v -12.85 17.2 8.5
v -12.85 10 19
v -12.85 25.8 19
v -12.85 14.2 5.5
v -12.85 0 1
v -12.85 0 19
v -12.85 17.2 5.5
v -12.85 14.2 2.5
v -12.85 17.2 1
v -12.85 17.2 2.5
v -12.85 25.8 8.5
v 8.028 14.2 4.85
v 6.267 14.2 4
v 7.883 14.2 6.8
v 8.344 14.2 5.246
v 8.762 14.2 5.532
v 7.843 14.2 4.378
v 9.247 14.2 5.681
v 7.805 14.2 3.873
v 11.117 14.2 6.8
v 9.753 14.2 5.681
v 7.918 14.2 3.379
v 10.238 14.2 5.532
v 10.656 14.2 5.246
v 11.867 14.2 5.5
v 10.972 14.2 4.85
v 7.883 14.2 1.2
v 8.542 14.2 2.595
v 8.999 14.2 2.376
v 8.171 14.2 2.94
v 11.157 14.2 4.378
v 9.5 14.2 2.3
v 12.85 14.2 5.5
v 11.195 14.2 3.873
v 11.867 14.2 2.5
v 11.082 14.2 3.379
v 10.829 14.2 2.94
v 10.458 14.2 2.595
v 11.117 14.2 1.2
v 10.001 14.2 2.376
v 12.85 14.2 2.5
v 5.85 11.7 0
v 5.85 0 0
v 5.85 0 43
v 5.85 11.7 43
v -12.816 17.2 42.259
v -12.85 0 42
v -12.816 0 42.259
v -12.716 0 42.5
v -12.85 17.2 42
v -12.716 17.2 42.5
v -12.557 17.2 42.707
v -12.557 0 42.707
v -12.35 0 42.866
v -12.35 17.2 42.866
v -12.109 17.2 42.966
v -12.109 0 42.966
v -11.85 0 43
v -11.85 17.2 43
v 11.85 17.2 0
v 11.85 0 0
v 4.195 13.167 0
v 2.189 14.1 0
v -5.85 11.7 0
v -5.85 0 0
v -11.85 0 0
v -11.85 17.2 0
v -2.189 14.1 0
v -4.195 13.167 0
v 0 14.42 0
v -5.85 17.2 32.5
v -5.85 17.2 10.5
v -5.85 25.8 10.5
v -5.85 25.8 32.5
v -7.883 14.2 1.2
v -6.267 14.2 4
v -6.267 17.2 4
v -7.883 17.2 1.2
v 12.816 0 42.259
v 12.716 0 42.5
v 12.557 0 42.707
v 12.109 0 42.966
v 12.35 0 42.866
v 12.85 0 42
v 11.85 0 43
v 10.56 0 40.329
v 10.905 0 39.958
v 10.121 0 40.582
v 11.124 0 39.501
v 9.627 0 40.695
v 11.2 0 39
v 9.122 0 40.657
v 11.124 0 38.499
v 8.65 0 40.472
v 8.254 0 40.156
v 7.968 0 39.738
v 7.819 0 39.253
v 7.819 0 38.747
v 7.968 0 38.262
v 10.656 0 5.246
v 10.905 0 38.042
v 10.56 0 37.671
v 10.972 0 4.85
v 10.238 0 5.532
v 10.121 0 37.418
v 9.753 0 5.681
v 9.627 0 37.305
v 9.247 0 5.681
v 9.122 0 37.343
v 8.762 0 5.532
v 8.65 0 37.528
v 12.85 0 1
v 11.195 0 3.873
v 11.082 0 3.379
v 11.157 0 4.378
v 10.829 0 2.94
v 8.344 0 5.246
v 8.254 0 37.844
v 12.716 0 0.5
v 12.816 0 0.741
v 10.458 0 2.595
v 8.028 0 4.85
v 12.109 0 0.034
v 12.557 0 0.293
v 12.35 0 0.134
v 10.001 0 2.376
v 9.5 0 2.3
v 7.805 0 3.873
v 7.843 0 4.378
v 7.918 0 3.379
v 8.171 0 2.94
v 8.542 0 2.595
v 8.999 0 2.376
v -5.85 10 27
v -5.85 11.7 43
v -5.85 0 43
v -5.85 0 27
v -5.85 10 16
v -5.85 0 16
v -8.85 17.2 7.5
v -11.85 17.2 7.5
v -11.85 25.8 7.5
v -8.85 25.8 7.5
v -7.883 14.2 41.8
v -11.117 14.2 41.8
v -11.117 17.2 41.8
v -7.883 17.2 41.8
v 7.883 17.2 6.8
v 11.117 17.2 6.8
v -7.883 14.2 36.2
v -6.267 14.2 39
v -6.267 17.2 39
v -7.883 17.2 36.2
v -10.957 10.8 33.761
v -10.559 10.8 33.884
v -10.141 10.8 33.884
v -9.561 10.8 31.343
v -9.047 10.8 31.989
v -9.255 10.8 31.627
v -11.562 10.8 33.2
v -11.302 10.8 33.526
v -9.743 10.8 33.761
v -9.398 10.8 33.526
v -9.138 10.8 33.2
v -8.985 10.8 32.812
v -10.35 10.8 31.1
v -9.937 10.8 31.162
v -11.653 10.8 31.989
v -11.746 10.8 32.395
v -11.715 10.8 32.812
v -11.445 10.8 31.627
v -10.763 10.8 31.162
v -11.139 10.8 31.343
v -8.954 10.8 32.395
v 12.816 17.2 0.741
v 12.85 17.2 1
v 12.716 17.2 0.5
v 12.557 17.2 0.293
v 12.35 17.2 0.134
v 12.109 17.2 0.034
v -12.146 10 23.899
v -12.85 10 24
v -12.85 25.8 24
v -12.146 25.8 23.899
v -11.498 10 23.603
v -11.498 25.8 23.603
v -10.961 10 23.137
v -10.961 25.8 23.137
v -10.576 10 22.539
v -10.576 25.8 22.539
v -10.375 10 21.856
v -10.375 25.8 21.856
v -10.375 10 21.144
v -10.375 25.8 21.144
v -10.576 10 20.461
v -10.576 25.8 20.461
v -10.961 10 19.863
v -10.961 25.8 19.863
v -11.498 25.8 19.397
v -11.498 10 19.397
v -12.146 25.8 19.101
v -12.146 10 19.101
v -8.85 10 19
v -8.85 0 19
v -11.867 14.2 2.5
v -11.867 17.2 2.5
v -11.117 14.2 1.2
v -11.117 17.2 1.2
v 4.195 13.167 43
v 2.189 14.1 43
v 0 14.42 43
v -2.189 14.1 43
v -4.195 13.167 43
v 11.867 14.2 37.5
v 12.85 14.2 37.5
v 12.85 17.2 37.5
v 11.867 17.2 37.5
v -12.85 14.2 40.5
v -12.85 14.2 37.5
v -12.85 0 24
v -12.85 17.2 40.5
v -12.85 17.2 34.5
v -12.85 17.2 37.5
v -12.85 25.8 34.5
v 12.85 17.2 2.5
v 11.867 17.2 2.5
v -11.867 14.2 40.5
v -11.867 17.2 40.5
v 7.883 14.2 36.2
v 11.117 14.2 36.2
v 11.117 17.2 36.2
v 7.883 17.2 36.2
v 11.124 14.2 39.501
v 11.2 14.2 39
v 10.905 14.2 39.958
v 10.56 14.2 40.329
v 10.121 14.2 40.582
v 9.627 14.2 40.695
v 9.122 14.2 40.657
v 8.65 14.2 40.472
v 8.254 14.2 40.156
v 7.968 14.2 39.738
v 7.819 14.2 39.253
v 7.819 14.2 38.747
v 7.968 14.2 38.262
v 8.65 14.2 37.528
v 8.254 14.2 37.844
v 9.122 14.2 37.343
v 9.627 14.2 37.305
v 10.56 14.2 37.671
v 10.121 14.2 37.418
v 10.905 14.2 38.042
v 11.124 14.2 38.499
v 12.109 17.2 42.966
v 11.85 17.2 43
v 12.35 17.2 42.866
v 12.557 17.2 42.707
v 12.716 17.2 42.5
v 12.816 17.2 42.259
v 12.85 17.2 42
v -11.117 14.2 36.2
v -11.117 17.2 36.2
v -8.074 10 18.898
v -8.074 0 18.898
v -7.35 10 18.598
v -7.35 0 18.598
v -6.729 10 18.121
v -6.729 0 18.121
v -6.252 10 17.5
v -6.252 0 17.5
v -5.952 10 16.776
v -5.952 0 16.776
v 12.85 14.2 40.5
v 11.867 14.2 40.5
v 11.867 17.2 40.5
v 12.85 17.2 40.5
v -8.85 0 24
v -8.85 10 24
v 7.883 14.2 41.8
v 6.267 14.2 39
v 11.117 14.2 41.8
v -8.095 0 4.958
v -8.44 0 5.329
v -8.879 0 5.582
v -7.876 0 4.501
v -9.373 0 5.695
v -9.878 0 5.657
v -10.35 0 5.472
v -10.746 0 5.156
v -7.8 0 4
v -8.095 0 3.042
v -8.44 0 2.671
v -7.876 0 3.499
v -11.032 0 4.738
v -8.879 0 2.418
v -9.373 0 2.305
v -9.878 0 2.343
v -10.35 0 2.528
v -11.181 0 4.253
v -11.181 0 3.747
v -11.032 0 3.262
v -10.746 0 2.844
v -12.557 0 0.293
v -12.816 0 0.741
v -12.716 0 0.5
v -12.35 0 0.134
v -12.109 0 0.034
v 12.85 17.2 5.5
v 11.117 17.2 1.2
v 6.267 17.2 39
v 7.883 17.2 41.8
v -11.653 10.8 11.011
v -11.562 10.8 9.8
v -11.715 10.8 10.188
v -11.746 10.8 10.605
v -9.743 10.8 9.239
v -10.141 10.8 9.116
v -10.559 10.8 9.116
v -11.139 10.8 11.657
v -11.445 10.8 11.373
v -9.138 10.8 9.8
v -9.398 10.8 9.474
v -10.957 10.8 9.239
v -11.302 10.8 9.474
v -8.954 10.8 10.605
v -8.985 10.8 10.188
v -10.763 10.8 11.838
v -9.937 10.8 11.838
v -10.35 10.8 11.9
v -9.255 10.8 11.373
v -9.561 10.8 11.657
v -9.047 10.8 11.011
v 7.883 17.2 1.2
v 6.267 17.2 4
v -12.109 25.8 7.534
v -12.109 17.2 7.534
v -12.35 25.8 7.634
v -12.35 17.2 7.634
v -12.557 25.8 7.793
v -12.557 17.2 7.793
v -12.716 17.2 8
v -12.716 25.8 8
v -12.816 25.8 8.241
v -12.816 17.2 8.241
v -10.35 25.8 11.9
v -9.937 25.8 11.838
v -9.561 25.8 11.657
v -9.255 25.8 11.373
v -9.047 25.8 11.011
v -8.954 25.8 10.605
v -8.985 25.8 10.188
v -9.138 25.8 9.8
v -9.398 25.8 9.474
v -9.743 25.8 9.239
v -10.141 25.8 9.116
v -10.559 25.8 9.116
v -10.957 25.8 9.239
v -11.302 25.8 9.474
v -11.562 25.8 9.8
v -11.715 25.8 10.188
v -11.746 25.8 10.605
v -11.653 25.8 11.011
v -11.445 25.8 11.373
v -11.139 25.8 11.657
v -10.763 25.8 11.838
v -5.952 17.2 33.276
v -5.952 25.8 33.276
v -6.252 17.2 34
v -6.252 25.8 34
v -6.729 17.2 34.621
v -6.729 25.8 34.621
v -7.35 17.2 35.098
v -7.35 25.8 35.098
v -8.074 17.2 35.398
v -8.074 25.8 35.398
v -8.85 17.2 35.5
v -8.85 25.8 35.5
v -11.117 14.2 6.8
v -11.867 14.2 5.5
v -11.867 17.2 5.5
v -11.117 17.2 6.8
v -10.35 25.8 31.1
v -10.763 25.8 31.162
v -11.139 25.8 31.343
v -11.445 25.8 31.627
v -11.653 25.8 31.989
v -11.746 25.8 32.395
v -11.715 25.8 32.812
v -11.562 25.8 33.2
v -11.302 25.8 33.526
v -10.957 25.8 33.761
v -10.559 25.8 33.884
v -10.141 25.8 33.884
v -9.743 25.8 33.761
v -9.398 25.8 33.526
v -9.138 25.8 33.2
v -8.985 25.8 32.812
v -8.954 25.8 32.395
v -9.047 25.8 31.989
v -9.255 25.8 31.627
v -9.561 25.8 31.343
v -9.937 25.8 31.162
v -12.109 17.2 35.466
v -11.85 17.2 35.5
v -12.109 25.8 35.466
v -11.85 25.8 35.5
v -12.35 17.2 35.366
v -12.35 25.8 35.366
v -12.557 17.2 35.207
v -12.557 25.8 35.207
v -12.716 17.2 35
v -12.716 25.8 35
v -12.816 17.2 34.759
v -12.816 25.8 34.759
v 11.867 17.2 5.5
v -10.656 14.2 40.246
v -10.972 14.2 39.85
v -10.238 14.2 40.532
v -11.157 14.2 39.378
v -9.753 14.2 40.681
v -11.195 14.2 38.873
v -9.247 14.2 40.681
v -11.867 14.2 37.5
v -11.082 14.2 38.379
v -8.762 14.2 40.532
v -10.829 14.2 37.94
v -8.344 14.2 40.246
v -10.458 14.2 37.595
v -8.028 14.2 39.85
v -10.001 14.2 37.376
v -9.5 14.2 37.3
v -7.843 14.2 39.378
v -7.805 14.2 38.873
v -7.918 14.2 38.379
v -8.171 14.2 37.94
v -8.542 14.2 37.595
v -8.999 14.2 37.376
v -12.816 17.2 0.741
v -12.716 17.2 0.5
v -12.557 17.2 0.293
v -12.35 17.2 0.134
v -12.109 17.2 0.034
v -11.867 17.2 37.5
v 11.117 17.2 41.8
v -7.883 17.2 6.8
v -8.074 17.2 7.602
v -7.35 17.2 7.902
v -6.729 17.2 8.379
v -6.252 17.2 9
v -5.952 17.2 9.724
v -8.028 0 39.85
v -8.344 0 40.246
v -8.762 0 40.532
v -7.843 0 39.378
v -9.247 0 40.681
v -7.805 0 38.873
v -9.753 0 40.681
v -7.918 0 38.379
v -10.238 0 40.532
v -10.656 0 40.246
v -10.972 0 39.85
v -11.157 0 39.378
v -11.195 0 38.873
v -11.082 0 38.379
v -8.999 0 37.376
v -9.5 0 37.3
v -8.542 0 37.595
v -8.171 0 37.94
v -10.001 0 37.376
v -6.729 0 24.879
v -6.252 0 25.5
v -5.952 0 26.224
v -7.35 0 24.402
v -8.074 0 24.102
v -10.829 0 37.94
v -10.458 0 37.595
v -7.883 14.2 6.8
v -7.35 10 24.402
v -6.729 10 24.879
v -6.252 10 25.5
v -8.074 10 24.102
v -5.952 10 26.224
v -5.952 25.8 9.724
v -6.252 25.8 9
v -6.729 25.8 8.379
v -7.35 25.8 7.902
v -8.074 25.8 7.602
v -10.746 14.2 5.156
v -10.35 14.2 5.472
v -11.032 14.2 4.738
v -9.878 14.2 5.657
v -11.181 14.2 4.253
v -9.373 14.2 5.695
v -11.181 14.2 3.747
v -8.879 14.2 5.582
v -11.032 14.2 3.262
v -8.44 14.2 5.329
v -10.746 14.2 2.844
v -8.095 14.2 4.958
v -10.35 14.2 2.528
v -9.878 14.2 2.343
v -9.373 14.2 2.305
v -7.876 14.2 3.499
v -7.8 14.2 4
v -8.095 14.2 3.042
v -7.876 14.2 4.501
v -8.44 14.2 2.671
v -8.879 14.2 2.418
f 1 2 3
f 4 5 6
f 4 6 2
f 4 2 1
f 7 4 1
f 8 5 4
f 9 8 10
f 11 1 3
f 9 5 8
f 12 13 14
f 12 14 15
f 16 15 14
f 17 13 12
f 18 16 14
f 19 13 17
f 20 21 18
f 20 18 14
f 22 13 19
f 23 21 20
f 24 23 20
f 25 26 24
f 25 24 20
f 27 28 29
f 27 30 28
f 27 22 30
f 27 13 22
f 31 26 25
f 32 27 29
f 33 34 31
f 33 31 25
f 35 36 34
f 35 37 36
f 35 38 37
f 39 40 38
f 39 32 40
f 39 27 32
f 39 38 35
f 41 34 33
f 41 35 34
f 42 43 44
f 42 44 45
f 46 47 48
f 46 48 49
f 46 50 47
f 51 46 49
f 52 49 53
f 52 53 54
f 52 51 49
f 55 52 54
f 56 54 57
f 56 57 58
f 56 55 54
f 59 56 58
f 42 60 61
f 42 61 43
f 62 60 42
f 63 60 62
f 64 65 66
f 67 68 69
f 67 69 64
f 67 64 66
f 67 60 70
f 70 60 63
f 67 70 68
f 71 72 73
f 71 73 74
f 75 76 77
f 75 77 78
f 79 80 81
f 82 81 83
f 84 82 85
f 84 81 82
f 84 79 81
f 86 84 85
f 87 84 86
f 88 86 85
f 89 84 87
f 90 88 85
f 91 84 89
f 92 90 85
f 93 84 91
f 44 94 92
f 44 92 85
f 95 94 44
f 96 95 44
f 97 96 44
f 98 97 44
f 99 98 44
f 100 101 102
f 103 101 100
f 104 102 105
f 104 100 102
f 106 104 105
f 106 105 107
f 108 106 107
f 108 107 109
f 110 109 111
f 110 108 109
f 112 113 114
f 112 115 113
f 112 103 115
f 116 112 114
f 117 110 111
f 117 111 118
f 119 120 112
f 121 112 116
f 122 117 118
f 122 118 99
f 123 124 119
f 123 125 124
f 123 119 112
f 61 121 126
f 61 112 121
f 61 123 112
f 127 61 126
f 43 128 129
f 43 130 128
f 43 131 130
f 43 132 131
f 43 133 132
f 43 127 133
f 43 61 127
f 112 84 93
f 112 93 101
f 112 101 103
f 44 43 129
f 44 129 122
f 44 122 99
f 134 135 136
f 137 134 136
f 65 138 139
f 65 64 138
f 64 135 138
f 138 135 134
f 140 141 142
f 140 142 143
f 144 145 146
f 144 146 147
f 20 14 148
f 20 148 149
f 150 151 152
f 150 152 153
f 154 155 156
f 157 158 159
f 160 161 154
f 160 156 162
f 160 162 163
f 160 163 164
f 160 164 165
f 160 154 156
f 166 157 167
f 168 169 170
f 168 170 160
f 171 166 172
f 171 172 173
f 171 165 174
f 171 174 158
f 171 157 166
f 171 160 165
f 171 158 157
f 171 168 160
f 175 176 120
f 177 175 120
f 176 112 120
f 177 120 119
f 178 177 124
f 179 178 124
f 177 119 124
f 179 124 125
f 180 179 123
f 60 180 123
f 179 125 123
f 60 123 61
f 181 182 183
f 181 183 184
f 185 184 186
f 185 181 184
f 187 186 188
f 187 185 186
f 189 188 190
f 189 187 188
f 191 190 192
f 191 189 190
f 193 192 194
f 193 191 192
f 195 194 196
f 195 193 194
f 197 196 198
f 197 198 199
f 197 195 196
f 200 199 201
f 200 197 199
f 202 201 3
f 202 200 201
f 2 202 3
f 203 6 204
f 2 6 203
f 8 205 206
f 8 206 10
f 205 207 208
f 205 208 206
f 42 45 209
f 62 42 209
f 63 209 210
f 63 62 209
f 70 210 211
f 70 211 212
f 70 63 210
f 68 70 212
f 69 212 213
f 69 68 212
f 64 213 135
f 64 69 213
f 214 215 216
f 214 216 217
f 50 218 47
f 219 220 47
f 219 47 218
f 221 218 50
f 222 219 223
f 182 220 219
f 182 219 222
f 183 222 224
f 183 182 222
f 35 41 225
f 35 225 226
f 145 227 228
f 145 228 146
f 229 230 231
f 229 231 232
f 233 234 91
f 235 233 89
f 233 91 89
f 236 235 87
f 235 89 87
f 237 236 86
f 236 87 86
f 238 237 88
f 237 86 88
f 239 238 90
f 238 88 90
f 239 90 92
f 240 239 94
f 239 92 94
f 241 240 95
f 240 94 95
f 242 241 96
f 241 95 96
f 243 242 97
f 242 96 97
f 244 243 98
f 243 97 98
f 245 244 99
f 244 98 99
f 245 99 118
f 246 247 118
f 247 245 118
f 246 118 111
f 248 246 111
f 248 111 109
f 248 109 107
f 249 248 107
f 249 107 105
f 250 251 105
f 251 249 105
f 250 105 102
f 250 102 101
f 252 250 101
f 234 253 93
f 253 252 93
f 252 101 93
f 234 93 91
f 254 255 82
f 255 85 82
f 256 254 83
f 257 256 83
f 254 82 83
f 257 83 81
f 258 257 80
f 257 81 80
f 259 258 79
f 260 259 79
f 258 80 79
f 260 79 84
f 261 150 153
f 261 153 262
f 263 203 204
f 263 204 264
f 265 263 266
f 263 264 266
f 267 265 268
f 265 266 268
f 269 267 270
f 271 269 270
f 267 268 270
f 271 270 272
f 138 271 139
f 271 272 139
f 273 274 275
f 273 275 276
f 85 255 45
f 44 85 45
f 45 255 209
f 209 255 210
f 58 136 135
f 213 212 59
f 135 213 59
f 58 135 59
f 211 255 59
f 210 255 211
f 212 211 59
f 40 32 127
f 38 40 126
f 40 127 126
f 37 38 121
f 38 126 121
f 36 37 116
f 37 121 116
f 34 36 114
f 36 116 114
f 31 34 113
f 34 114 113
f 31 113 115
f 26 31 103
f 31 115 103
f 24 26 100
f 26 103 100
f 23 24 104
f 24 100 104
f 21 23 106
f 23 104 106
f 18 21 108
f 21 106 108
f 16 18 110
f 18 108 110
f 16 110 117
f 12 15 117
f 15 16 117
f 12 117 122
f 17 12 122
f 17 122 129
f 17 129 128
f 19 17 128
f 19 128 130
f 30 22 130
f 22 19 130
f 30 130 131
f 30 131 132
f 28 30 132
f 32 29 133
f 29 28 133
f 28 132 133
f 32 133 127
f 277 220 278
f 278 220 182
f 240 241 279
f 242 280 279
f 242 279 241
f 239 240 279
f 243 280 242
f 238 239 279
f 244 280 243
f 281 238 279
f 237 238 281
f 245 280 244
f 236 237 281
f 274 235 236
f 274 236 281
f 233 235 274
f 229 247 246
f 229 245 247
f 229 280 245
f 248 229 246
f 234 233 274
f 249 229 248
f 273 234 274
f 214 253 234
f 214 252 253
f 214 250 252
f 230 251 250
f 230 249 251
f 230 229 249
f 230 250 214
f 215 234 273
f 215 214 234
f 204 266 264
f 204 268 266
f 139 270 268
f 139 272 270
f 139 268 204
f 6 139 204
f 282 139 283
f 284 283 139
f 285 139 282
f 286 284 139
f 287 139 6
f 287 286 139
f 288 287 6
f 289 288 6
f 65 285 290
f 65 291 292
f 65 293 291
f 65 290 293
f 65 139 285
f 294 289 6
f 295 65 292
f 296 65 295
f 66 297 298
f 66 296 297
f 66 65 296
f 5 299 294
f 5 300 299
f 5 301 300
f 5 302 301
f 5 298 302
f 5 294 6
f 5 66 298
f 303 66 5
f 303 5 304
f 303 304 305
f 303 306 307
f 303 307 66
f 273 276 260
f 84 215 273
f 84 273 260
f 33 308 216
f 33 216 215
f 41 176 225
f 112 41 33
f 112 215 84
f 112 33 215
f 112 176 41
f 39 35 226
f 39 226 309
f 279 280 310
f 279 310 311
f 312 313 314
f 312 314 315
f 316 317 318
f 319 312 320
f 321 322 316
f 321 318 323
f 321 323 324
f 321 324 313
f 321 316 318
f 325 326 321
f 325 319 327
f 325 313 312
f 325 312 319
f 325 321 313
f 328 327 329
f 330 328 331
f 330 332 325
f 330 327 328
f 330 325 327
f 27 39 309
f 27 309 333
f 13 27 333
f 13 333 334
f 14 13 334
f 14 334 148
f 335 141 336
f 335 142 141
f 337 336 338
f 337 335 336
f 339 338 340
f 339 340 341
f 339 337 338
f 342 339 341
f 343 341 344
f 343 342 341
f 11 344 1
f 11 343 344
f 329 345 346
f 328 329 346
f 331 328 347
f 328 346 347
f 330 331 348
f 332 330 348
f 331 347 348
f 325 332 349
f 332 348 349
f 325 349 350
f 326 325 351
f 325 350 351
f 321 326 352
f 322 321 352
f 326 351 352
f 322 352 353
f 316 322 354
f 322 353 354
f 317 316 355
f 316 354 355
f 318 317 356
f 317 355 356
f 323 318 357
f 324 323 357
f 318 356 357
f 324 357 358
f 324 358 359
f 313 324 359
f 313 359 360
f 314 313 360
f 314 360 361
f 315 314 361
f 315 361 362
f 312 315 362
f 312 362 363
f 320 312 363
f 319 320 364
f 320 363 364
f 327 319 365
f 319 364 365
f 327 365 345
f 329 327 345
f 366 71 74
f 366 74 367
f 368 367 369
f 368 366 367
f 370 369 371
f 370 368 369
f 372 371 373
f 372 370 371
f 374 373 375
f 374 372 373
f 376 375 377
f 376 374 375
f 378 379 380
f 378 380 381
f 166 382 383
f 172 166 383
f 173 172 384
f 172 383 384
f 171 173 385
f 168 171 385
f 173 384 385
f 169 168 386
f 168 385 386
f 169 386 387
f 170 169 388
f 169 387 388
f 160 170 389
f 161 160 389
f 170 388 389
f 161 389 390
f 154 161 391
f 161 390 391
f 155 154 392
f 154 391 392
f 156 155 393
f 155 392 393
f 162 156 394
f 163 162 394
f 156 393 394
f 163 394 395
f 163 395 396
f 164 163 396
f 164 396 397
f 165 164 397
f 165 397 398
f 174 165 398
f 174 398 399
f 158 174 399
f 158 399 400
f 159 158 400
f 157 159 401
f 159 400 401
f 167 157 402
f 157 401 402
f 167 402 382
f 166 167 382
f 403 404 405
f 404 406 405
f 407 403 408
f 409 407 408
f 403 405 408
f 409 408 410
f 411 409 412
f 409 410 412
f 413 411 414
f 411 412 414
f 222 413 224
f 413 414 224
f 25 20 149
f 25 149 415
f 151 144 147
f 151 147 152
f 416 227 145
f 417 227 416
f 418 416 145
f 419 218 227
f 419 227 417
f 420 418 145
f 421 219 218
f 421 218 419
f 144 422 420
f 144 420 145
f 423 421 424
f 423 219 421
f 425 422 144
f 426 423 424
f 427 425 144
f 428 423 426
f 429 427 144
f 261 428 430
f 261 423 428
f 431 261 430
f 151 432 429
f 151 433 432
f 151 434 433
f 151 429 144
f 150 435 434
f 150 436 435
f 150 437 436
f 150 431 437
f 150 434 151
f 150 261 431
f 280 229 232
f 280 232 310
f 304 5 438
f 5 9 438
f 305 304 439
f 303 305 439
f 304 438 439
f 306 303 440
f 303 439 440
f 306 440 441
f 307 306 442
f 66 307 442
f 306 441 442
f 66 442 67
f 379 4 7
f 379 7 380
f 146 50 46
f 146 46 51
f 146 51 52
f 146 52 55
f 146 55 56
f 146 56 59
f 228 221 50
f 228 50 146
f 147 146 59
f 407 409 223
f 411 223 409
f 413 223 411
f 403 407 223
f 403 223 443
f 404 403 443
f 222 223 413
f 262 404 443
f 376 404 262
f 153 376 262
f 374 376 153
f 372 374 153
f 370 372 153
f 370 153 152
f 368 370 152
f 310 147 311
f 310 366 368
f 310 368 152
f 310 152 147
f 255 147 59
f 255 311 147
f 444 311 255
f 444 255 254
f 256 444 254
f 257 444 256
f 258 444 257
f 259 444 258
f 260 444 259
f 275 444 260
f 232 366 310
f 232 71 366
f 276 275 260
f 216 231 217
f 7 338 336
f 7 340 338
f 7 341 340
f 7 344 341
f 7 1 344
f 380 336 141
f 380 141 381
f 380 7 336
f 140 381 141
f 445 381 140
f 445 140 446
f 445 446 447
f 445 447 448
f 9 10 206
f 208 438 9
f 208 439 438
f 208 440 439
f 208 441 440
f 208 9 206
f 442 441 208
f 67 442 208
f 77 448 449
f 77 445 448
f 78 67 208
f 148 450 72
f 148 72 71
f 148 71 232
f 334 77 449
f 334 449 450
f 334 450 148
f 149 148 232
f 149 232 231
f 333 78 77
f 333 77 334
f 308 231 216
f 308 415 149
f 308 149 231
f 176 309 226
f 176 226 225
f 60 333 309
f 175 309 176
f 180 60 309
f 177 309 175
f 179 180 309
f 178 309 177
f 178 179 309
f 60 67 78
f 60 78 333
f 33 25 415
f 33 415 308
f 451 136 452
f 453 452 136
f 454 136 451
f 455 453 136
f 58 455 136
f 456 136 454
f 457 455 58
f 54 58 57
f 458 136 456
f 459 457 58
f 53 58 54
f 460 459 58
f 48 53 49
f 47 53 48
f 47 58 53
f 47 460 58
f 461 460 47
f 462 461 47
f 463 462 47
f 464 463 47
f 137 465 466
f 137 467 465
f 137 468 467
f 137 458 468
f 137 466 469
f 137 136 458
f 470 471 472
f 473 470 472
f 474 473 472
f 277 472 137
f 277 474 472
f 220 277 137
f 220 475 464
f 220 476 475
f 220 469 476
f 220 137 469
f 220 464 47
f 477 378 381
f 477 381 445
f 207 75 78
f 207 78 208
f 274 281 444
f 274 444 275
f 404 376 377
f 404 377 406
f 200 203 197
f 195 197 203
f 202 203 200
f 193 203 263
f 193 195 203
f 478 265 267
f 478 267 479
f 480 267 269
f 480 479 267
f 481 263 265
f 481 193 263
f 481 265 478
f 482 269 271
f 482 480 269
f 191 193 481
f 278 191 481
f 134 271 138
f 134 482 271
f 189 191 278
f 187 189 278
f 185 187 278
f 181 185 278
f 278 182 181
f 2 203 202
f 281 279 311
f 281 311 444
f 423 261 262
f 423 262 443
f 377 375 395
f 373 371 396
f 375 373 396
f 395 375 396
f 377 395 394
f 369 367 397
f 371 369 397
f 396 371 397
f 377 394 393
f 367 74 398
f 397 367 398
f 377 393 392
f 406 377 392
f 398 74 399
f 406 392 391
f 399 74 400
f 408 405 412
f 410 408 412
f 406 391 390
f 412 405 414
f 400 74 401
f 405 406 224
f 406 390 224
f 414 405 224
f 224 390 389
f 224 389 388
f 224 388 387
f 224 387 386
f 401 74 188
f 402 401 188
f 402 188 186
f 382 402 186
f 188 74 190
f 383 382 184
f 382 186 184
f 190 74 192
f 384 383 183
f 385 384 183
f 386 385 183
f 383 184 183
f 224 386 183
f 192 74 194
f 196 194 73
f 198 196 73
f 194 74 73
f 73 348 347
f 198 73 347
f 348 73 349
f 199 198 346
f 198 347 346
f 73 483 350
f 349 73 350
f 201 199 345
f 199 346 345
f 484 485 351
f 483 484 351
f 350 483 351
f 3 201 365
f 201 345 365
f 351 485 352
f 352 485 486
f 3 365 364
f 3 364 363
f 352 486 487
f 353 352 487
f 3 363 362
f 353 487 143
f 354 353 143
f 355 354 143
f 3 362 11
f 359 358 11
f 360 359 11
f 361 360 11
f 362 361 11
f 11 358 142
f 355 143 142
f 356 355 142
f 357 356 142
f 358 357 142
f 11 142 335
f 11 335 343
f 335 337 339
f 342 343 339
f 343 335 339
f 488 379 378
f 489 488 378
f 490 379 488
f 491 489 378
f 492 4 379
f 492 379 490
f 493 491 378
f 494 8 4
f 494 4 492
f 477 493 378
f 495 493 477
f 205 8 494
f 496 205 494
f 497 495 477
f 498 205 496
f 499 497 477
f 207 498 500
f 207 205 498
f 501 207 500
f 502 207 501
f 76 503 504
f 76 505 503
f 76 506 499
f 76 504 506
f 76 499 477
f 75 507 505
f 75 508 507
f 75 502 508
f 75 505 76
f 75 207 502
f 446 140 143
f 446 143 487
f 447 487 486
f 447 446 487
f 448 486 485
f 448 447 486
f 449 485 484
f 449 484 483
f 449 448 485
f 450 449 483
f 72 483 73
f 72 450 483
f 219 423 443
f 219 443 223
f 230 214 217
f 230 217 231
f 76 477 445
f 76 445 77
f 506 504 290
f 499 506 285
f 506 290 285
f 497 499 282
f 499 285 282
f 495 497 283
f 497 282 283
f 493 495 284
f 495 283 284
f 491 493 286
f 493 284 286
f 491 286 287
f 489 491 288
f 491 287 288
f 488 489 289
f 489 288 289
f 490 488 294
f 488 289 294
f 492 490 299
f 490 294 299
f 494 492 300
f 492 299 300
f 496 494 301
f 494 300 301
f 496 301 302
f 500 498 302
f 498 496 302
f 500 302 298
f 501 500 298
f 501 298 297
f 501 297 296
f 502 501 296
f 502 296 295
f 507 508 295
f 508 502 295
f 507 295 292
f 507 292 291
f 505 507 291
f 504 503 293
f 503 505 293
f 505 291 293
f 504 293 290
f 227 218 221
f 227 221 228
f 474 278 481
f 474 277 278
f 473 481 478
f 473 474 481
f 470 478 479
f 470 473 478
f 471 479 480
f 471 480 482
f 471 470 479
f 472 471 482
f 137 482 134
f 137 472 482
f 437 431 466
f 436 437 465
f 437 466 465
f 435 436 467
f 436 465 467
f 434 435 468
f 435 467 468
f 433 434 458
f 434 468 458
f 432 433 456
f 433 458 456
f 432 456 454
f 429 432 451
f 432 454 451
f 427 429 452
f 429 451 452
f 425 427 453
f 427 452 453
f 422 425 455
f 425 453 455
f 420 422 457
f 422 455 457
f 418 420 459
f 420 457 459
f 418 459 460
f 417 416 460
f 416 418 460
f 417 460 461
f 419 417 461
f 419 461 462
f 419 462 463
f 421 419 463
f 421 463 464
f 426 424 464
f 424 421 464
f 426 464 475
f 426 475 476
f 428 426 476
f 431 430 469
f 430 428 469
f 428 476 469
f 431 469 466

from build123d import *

# Parameters (mm, degrees)
EXTRUDE_1_DEPTH     = 43
EXTRUDE_2_DEPTH     = 8.6
SKETCH_3_R          = 1.4
CUT_EXTRUDE_1_DEPTH = 15
CUT_EXTRUDE_START   = -17.2
SKETCH_4_R          = 2.5
CUT_EXTRUDE_2_DEPTH = 17.2
SKETCH_5_W          = 5
SKETCH_5_H          = 10
CUT_EXTRUDE_3_DEPTH = 15
SKETCH_6_R          = 1.7
CUT_EXTRUDE_4_DEPTH = 20
CUT_EXTRUDE_START_2 = -3
SKETCH_7_W          = 2.192810324
SKETCH_7_H          = 3
SKETCH_7_R          = 1.7
CUT_EXTRUDE_5_DEPTH = 3
FILLET_1_R          = 3
FILLET_2_R          = 1


with BuildPart() as part:
    # Эскиз1 → Бобышка-Вытянуть1 (new body)
    with BuildSketch(Plane.XY):
        with BuildLine():
            Line((5.85, 0), (5.85, 11.699503018))
            ThreePointArc((5.85, 11.699503018), (0, 14.42), (-5.85, 11.699503018))
            Line((-5.85, 11.699503018), (-5.85, 0))
            Line((-5.85, 0), (-12.85, 0))
            Line((-12.85, 0), (-12.85, 17.2))
            Line((-12.85, 17.2), (12.85, 17.2))
            Line((12.85, 17.2), (12.85, 0))
            Line((12.85, 0), (5.85, 0))
        make_face()
    extrude(amount=EXTRUDE_1_DEPTH)

    # Эскиз2 → Бобышка-Вытянуть2 (add)
    with BuildSketch(Plane(origin=(0, 17.2, 0), x_dir=(1, 0, 0), z_dir=(0, 1, 0))):
        with BuildLine():
            Line((-12.85, -7.5), (-8.85, -7.5))
            ThreePointArc((-8.85, -7.5), (-6.728679656, -8.378679656), (-5.85, -10.5))
            Line((-5.85, -10.5), (-5.85, -32.5))
            ThreePointArc((-5.85, -32.5), (-6.728679656, -34.621320344), (-8.85, -35.5))
            Line((-8.85, -35.5), (-12.85, -35.5))
            Line((-12.85, -35.5), (-12.85, -24))
            ThreePointArc((-12.85, -24), (-10.35, -21.5), (-12.85, -19))
            Line((-12.85, -19), (-12.85, -7.5))
        make_face()
    extrude(amount=EXTRUDE_2_DEPTH)

    # Эскиз3 → Вырез-Вытянуть1 (cut)
    with BuildSketch(Plane(origin=(0, 25.8, 0), x_dir=(1, 0, 0), z_dir=(0, 1, 0))):
        with Locations(Location((-10.35, -10.5, 0), (0, 0, 270))):
            Circle(SKETCH_3_R)
        with Locations(Location((-10.35, -32.5, 0), (0, 0, 90))):
            Circle(SKETCH_3_R)
    extrude(amount=-CUT_EXTRUDE_1_DEPTH, mode=Mode.SUBTRACT)

    # Эскиз4 → Вырез-Вытянуть2 (cut)
    with BuildSketch(Plane(origin=(0, 17.2, 0), x_dir=(1, 0, 0), z_dir=(0, 1, 0)).offset(CUT_EXTRUDE_START)):
        with Locations((-12.85, -21.5)):
            Circle(SKETCH_4_R)
    extrude(amount=CUT_EXTRUDE_2_DEPTH, mode=Mode.SUBTRACT)

    # Эскиз5 → Вырез-Вытянуть3 (cut)
    with BuildSketch(Plane.ZY.offset(12.85)):
        with Locations((21.5, 5)):
            Rectangle(SKETCH_5_W, SKETCH_5_H)
    extrude(amount=-CUT_EXTRUDE_3_DEPTH, mode=Mode.SUBTRACT)

    # Эскиз6 → Вырез-Вытянуть4 (cut)
    with BuildSketch(Plane.XZ):
        with Locations((9.5, 39)):
            Circle(SKETCH_6_R)
        with Locations(Location((-9.5, 39, 0), (0, 0, 270))):
            Circle(SKETCH_6_R)
        with Locations(Location((9.5, 4, 0), (0, 0, 270))):
            Circle(SKETCH_6_R)
        with Locations((-9.5, 4)):
            Circle(SKETCH_6_R)
    extrude(amount=-CUT_EXTRUDE_4_DEPTH, mode=Mode.SUBTRACT)

    # Эскиз7 → Вырез-Вытянуть5 (cut)
    # profile 1 of 8: a face of its own
    with BuildSketch(Plane(origin=(0, 17.2, 0), x_dir=(1, 0, 0), z_dir=(0, 1, 0)).offset(CUT_EXTRUDE_START_2)):
        with Locations((-13.946405162, -4)):
            Rectangle(SKETCH_7_W, SKETCH_7_H)
    # profile 2 of 8: a face of its own
    with BuildSketch(Plane(origin=(0, 17.2, 0), x_dir=(1, 0, 0), z_dir=(0, 1, 0)).offset(CUT_EXTRUDE_START_2)):
        Polygon((-12.85, -5.5), (-11.867136104, -5.5), (-11.116580754, -6.8), (-7.883419246, -6.8), (-6.266838493, -4), (-7.883419246, -1.2), (-11.116580754, -1.2), (-11.867136104, -2.5), (-12.85, -2.5), align=None)
        with Locations((-9.5, -4)):
            Circle(SKETCH_7_R, mode=Mode.SUBTRACT)
    # profile 3 of 8: a face of its own
    with BuildSketch(Plane(origin=(0, 17.2, 0), x_dir=(1, 0, 0), z_dir=(0, 1, 0)).offset(CUT_EXTRUDE_START_2)):
        Polygon((12.85, -5.5), (12.85, -2.5), (11.867136104, -2.5), (11.116580754, -1.2), (7.883419246, -1.2), (6.266838493, -4), (7.883419246, -6.8), (11.116580754, -6.8), (11.867136104, -5.5), align=None)
        with Locations(Location((9.5, -4, 0), (0, 0, 270))):
            Circle(SKETCH_7_R, mode=Mode.SUBTRACT)
    # profile 4 of 8: a face of its own
    with BuildSketch(Plane(origin=(0, 17.2, 0), x_dir=(1, 0, 0), z_dir=(0, 1, 0)).offset(CUT_EXTRUDE_START_2)):
        with Locations((13.946405162, -4)):
            Rectangle(SKETCH_7_W, SKETCH_7_H)
    # profile 5 of 8: a face of its own
    with BuildSketch(Plane(origin=(0, 17.2, 0), x_dir=(1, 0, 0), z_dir=(0, 1, 0)).offset(CUT_EXTRUDE_START_2)):
        with Locations((13.946405162, -39)):
            Rectangle(SKETCH_7_W, SKETCH_7_H)
    # profile 6 of 8: a face of its own
    with BuildSketch(Plane(origin=(0, 17.2, 0), x_dir=(1, 0, 0), z_dir=(0, 1, 0)).offset(CUT_EXTRUDE_START_2)):
        Polygon((12.85, -40.5), (12.85, -37.5), (11.867136104, -37.5), (11.116580754, -36.2), (7.883419246, -36.2), (6.266838493, -39), (7.883419246, -41.8), (11.116580754, -41.8), (11.867136104, -40.5), align=None)
        with Locations((9.5, -39)):
            Circle(SKETCH_7_R, mode=Mode.SUBTRACT)
    # profile 7 of 8: a face of its own
    with BuildSketch(Plane(origin=(0, 17.2, 0), x_dir=(1, 0, 0), z_dir=(0, 1, 0)).offset(CUT_EXTRUDE_START_2)):
        Polygon((-11.867136104, -37.5), (-12.85, -37.5), (-12.85, -40.5), (-11.867136104, -40.5), (-11.116580754, -41.8), (-7.883419246, -41.8), (-6.266838493, -39), (-7.883419246, -36.2), (-11.116580754, -36.2), align=None)
        with Locations(Location((-9.5, -39, 0), (0, 0, 270))):
            Circle(SKETCH_7_R, mode=Mode.SUBTRACT)
    # profile 8 of 8: a face of its own
    with BuildSketch(Plane(origin=(0, 17.2, 0), x_dir=(1, 0, 0), z_dir=(0, 1, 0)).offset(CUT_EXTRUDE_START_2)):
        with Locations((-13.946405162, -39)):
            Rectangle(SKETCH_7_W, SKETCH_7_H)
    extrude(amount=CUT_EXTRUDE_5_DEPTH, mode=Mode.SUBTRACT)

    # Скругление1
    fillet_1_edges = [part.edges().sort_by_distance(p)[0] for p in [
        (-5.85, 5, 24),
        (-5.85, 5, 19),
    ]]
    fillet(fillet_1_edges, radius=FILLET_1_R)

    # Скругление2
    fillet_2_edges = [part.edges().sort_by_distance(p)[0] for p in [
        (12.85, 8.6, 0),
        (-12.85, 8.6, 0),
        (12.85, 8.6, 43),
        (-12.85, 8.6, 43),
        (-12.85, 21.5, 35.5),
        (-12.85, 21.5, 7.5),
    ]]
    fillet(fillet_2_edges, radius=FILLET_2_R)


solid = part.part
